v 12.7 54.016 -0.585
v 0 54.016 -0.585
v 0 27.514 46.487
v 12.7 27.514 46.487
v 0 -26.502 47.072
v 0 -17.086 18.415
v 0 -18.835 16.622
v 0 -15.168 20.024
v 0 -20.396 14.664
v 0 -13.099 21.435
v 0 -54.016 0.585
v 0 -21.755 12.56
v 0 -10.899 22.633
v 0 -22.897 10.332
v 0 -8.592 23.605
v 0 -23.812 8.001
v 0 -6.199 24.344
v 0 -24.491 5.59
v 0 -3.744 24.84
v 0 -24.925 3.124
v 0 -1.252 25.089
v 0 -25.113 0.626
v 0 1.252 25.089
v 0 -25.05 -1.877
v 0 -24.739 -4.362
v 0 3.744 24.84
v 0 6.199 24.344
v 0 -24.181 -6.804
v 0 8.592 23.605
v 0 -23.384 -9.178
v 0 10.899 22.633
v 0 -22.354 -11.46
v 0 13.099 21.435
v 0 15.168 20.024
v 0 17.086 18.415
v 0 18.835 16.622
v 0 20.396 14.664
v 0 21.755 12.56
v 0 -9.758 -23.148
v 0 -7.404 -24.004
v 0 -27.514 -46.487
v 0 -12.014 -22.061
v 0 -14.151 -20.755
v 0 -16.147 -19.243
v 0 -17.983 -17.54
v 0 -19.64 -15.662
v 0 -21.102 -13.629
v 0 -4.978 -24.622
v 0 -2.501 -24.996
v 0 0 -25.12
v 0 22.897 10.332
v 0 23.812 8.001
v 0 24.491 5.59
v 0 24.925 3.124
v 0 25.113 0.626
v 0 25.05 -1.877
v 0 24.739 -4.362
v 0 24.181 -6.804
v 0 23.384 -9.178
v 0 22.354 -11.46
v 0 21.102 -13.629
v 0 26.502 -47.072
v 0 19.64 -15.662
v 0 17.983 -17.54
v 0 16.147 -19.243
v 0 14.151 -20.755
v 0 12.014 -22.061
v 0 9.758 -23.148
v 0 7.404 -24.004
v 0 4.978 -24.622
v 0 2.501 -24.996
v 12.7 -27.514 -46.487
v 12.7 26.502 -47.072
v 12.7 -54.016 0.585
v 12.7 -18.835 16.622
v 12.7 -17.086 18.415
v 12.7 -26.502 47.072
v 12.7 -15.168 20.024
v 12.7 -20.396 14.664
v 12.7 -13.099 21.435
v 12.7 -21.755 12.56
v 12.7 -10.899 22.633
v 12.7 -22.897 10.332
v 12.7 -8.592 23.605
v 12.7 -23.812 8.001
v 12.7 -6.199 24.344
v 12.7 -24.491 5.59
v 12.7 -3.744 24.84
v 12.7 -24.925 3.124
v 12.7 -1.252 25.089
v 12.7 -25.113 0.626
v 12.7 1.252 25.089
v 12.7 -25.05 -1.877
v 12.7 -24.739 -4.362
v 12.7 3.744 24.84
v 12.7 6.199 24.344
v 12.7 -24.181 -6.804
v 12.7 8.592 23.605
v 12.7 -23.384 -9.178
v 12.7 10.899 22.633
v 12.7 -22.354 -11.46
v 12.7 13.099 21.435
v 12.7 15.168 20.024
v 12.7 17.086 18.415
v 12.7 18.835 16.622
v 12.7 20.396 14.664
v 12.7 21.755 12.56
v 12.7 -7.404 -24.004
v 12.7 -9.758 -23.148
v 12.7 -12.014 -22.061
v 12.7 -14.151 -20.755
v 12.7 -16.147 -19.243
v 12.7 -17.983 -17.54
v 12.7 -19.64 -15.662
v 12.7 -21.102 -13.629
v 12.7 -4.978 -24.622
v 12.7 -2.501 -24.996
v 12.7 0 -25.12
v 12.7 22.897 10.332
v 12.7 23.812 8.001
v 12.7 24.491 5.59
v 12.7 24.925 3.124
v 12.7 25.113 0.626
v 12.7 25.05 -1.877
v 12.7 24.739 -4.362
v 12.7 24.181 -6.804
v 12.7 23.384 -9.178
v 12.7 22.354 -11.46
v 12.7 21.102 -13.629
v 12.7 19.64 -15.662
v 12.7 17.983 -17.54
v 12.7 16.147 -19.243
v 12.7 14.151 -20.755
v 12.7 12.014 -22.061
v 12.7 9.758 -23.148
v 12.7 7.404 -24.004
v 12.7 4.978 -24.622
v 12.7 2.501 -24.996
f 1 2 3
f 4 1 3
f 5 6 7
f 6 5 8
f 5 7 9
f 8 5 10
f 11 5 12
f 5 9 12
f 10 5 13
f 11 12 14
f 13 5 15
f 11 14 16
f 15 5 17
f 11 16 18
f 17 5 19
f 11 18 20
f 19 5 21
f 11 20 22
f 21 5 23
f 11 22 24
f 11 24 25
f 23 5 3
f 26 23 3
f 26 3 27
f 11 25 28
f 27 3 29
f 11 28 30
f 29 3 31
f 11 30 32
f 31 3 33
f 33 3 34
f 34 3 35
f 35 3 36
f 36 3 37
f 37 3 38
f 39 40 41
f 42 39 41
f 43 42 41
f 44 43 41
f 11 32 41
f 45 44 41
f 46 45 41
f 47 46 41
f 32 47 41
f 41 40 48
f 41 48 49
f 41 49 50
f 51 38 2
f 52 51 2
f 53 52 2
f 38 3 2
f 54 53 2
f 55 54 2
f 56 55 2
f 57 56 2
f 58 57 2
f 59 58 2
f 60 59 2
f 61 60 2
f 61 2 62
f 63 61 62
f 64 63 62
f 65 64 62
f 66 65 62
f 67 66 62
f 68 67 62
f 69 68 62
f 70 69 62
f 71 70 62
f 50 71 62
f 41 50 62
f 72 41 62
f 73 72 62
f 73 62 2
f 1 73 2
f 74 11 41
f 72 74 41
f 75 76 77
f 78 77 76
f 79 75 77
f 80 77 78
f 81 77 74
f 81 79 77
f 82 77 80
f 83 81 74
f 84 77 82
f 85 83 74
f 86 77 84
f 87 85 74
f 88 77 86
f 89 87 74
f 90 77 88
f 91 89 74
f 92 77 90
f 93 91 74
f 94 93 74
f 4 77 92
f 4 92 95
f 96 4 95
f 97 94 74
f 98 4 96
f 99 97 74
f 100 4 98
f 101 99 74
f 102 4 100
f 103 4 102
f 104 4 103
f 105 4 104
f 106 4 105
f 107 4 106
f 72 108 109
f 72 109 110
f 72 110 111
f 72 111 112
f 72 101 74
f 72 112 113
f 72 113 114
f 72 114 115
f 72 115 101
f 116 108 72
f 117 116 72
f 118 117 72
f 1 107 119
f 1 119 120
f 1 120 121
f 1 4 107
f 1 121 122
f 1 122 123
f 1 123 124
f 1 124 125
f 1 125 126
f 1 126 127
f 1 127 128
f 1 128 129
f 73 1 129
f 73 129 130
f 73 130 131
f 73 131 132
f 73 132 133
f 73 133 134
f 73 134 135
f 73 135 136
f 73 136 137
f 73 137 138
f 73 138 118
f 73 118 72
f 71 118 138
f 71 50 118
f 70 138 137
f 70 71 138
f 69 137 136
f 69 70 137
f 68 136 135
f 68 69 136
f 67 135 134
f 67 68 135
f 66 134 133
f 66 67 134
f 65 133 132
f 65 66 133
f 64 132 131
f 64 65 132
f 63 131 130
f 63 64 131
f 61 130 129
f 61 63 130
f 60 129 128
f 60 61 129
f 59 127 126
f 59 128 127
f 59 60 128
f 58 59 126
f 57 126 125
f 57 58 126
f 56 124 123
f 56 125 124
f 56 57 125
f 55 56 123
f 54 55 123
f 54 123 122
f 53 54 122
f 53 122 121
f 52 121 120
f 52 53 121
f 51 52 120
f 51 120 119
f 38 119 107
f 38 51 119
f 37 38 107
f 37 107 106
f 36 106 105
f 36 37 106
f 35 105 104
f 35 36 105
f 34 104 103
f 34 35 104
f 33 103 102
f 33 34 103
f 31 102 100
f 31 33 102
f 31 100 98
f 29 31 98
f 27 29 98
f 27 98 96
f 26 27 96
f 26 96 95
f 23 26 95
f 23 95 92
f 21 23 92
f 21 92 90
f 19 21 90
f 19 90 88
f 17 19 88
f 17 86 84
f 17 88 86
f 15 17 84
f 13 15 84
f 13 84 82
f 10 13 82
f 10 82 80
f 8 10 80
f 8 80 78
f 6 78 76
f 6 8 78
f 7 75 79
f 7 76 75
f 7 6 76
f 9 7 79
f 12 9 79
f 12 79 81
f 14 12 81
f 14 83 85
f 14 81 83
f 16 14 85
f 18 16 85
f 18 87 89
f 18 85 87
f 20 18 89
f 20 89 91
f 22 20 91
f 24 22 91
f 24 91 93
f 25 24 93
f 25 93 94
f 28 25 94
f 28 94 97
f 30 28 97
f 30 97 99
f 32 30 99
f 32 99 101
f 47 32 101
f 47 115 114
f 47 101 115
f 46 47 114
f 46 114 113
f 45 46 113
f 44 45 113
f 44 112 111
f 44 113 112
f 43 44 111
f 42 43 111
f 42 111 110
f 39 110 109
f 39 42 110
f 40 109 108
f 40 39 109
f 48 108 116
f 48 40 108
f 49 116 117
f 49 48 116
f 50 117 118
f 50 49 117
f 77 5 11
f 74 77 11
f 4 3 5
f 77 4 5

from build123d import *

# Parameters (mm, degrees)
BOSS_EXTRUDE1_DEPTH     = 12.7
CUT_EXTRUDE1_DEPTH      = 73.765244725
CUT_EXTRUDE1_DEPTH_BACK = 73.765244725
SKETCH5_R               = 25.120382551


with BuildPart() as part:
    # Sketch4 → Boss-Extrude1 (new body)
    with BuildSketch(Plane(origin=(0, 0, 0), x_dir=(0, 0, -1), z_dir=(1, 0, 0))):
        Polygon((-47.071700205, -26.501749912), (-0.584661434, -54.016163133), (46.487038771, -27.514413221), (47.071700205, 26.501749912), (0.584661434, 54.016163133), (-46.487038771, 27.514413221), align=None)
    extrude(amount=BOSS_EXTRUDE1_DEPTH)

    # Sketch5 → Cut-Extrude1 (cut, two sides: drawn at the far end of the back side and taken through both)
    with BuildSketch(Plane(origin=(12.7, 0, 0), x_dir=(0, 0, -1), z_dir=(1, 0, 0)).offset(-CUT_EXTRUDE1_DEPTH_BACK)):
        Circle(SKETCH5_R)
    extrude(amount=CUT_EXTRUDE1_DEPTH + CUT_EXTRUDE1_DEPTH_BACK, mode=Mode.SUBTRACT)


solid = part.part
